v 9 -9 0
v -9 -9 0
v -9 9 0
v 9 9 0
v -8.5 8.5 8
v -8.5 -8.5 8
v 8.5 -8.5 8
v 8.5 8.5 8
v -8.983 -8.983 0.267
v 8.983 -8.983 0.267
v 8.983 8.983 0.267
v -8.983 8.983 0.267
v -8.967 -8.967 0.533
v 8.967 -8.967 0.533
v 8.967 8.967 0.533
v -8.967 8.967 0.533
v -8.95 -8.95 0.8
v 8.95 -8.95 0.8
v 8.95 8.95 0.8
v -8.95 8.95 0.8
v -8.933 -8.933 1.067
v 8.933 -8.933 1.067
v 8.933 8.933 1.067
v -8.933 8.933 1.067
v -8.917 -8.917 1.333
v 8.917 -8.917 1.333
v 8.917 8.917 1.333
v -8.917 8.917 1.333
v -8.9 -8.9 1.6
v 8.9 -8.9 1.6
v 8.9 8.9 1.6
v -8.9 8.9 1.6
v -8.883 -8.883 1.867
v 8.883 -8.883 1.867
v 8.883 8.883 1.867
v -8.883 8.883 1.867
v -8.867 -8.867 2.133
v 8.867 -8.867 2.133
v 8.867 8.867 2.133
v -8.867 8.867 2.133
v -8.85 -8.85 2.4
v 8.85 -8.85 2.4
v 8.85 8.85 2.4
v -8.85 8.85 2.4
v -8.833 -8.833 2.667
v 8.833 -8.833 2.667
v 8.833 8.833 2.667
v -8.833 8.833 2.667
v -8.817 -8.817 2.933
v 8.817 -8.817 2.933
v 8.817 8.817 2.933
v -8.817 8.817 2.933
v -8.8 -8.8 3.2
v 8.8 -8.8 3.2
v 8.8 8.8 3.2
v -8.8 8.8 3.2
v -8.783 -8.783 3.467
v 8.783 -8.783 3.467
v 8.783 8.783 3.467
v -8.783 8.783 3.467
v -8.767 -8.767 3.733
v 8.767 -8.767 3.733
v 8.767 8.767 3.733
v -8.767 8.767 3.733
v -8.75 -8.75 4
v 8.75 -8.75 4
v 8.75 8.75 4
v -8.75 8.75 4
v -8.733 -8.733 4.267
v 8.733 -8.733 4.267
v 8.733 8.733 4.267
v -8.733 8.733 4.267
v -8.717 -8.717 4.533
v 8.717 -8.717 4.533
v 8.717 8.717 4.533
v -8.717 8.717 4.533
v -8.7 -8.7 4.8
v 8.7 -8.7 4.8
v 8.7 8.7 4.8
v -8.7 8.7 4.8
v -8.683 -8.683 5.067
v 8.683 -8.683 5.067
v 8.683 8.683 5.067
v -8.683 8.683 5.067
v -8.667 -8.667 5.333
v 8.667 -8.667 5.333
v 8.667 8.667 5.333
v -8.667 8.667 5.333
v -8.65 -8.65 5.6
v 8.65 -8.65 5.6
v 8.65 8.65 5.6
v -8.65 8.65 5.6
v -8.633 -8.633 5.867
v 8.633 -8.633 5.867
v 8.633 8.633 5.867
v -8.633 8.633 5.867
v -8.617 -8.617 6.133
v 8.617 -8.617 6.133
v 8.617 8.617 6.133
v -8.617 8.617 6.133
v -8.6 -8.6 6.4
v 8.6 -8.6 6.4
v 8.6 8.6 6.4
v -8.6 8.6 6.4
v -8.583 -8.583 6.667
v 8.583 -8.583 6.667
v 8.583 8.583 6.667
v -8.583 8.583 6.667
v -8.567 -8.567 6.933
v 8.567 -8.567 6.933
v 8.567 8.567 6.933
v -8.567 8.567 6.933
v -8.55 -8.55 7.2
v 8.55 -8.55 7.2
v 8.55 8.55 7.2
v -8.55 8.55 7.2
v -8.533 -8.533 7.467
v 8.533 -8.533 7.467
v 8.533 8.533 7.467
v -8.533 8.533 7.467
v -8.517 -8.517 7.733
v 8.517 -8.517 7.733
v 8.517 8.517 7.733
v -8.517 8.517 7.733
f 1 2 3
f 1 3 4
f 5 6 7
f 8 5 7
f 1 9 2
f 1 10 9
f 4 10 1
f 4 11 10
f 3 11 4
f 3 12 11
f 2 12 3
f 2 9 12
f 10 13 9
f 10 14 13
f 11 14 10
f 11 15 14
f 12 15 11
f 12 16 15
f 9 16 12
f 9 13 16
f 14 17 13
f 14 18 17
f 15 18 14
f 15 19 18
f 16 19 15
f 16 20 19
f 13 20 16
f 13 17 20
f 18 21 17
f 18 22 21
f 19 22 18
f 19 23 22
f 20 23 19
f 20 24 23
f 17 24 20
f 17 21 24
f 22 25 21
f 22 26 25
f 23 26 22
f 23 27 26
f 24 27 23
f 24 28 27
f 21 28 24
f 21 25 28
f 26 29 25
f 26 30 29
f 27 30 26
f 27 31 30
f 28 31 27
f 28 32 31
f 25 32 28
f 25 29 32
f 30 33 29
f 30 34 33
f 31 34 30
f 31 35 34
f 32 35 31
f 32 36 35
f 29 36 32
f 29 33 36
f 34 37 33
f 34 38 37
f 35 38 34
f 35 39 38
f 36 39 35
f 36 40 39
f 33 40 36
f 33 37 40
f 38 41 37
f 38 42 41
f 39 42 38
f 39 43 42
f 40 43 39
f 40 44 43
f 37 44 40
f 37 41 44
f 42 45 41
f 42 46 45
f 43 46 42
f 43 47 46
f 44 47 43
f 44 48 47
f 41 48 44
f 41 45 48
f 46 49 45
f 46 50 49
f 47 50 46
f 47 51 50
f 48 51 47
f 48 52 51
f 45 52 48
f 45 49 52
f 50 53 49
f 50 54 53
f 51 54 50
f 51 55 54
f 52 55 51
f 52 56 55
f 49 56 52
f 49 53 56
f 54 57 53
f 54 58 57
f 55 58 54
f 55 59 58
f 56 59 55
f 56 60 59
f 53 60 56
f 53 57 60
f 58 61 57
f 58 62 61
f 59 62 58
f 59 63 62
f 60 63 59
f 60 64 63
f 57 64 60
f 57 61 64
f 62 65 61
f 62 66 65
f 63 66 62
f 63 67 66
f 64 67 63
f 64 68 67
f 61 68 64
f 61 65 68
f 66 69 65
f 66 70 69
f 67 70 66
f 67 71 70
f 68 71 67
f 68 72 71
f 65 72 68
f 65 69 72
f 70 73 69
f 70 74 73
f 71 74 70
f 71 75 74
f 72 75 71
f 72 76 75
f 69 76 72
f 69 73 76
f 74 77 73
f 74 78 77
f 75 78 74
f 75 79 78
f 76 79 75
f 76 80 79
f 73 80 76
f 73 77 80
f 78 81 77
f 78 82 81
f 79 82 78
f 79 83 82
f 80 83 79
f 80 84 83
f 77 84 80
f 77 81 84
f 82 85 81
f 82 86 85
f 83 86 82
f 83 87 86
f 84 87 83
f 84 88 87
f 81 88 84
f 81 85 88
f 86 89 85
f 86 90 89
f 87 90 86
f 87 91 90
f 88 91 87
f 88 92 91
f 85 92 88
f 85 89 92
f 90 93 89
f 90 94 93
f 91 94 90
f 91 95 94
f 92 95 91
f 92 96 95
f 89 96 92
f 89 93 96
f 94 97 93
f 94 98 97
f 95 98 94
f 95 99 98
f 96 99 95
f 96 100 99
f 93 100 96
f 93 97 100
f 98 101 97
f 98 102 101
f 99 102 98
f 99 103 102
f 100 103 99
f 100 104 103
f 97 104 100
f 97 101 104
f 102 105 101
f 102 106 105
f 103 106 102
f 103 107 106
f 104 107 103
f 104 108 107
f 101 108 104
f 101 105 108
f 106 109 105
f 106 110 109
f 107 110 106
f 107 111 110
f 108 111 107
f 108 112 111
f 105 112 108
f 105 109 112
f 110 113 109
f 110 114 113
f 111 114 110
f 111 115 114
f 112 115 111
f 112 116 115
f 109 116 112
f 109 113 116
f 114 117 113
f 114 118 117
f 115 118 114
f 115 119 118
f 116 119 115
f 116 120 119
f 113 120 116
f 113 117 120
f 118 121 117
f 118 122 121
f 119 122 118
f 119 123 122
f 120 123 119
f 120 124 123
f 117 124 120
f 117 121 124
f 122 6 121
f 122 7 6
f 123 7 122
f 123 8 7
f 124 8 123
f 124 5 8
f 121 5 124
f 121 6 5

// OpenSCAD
// 放样：底部 18mm 正方形 → 顶部 17mm 正方形，高度 8mm
linear_extrude(height = 8, scale = 17 / 18, slices = 30, convexity = 10)
    square(18, center = true);
